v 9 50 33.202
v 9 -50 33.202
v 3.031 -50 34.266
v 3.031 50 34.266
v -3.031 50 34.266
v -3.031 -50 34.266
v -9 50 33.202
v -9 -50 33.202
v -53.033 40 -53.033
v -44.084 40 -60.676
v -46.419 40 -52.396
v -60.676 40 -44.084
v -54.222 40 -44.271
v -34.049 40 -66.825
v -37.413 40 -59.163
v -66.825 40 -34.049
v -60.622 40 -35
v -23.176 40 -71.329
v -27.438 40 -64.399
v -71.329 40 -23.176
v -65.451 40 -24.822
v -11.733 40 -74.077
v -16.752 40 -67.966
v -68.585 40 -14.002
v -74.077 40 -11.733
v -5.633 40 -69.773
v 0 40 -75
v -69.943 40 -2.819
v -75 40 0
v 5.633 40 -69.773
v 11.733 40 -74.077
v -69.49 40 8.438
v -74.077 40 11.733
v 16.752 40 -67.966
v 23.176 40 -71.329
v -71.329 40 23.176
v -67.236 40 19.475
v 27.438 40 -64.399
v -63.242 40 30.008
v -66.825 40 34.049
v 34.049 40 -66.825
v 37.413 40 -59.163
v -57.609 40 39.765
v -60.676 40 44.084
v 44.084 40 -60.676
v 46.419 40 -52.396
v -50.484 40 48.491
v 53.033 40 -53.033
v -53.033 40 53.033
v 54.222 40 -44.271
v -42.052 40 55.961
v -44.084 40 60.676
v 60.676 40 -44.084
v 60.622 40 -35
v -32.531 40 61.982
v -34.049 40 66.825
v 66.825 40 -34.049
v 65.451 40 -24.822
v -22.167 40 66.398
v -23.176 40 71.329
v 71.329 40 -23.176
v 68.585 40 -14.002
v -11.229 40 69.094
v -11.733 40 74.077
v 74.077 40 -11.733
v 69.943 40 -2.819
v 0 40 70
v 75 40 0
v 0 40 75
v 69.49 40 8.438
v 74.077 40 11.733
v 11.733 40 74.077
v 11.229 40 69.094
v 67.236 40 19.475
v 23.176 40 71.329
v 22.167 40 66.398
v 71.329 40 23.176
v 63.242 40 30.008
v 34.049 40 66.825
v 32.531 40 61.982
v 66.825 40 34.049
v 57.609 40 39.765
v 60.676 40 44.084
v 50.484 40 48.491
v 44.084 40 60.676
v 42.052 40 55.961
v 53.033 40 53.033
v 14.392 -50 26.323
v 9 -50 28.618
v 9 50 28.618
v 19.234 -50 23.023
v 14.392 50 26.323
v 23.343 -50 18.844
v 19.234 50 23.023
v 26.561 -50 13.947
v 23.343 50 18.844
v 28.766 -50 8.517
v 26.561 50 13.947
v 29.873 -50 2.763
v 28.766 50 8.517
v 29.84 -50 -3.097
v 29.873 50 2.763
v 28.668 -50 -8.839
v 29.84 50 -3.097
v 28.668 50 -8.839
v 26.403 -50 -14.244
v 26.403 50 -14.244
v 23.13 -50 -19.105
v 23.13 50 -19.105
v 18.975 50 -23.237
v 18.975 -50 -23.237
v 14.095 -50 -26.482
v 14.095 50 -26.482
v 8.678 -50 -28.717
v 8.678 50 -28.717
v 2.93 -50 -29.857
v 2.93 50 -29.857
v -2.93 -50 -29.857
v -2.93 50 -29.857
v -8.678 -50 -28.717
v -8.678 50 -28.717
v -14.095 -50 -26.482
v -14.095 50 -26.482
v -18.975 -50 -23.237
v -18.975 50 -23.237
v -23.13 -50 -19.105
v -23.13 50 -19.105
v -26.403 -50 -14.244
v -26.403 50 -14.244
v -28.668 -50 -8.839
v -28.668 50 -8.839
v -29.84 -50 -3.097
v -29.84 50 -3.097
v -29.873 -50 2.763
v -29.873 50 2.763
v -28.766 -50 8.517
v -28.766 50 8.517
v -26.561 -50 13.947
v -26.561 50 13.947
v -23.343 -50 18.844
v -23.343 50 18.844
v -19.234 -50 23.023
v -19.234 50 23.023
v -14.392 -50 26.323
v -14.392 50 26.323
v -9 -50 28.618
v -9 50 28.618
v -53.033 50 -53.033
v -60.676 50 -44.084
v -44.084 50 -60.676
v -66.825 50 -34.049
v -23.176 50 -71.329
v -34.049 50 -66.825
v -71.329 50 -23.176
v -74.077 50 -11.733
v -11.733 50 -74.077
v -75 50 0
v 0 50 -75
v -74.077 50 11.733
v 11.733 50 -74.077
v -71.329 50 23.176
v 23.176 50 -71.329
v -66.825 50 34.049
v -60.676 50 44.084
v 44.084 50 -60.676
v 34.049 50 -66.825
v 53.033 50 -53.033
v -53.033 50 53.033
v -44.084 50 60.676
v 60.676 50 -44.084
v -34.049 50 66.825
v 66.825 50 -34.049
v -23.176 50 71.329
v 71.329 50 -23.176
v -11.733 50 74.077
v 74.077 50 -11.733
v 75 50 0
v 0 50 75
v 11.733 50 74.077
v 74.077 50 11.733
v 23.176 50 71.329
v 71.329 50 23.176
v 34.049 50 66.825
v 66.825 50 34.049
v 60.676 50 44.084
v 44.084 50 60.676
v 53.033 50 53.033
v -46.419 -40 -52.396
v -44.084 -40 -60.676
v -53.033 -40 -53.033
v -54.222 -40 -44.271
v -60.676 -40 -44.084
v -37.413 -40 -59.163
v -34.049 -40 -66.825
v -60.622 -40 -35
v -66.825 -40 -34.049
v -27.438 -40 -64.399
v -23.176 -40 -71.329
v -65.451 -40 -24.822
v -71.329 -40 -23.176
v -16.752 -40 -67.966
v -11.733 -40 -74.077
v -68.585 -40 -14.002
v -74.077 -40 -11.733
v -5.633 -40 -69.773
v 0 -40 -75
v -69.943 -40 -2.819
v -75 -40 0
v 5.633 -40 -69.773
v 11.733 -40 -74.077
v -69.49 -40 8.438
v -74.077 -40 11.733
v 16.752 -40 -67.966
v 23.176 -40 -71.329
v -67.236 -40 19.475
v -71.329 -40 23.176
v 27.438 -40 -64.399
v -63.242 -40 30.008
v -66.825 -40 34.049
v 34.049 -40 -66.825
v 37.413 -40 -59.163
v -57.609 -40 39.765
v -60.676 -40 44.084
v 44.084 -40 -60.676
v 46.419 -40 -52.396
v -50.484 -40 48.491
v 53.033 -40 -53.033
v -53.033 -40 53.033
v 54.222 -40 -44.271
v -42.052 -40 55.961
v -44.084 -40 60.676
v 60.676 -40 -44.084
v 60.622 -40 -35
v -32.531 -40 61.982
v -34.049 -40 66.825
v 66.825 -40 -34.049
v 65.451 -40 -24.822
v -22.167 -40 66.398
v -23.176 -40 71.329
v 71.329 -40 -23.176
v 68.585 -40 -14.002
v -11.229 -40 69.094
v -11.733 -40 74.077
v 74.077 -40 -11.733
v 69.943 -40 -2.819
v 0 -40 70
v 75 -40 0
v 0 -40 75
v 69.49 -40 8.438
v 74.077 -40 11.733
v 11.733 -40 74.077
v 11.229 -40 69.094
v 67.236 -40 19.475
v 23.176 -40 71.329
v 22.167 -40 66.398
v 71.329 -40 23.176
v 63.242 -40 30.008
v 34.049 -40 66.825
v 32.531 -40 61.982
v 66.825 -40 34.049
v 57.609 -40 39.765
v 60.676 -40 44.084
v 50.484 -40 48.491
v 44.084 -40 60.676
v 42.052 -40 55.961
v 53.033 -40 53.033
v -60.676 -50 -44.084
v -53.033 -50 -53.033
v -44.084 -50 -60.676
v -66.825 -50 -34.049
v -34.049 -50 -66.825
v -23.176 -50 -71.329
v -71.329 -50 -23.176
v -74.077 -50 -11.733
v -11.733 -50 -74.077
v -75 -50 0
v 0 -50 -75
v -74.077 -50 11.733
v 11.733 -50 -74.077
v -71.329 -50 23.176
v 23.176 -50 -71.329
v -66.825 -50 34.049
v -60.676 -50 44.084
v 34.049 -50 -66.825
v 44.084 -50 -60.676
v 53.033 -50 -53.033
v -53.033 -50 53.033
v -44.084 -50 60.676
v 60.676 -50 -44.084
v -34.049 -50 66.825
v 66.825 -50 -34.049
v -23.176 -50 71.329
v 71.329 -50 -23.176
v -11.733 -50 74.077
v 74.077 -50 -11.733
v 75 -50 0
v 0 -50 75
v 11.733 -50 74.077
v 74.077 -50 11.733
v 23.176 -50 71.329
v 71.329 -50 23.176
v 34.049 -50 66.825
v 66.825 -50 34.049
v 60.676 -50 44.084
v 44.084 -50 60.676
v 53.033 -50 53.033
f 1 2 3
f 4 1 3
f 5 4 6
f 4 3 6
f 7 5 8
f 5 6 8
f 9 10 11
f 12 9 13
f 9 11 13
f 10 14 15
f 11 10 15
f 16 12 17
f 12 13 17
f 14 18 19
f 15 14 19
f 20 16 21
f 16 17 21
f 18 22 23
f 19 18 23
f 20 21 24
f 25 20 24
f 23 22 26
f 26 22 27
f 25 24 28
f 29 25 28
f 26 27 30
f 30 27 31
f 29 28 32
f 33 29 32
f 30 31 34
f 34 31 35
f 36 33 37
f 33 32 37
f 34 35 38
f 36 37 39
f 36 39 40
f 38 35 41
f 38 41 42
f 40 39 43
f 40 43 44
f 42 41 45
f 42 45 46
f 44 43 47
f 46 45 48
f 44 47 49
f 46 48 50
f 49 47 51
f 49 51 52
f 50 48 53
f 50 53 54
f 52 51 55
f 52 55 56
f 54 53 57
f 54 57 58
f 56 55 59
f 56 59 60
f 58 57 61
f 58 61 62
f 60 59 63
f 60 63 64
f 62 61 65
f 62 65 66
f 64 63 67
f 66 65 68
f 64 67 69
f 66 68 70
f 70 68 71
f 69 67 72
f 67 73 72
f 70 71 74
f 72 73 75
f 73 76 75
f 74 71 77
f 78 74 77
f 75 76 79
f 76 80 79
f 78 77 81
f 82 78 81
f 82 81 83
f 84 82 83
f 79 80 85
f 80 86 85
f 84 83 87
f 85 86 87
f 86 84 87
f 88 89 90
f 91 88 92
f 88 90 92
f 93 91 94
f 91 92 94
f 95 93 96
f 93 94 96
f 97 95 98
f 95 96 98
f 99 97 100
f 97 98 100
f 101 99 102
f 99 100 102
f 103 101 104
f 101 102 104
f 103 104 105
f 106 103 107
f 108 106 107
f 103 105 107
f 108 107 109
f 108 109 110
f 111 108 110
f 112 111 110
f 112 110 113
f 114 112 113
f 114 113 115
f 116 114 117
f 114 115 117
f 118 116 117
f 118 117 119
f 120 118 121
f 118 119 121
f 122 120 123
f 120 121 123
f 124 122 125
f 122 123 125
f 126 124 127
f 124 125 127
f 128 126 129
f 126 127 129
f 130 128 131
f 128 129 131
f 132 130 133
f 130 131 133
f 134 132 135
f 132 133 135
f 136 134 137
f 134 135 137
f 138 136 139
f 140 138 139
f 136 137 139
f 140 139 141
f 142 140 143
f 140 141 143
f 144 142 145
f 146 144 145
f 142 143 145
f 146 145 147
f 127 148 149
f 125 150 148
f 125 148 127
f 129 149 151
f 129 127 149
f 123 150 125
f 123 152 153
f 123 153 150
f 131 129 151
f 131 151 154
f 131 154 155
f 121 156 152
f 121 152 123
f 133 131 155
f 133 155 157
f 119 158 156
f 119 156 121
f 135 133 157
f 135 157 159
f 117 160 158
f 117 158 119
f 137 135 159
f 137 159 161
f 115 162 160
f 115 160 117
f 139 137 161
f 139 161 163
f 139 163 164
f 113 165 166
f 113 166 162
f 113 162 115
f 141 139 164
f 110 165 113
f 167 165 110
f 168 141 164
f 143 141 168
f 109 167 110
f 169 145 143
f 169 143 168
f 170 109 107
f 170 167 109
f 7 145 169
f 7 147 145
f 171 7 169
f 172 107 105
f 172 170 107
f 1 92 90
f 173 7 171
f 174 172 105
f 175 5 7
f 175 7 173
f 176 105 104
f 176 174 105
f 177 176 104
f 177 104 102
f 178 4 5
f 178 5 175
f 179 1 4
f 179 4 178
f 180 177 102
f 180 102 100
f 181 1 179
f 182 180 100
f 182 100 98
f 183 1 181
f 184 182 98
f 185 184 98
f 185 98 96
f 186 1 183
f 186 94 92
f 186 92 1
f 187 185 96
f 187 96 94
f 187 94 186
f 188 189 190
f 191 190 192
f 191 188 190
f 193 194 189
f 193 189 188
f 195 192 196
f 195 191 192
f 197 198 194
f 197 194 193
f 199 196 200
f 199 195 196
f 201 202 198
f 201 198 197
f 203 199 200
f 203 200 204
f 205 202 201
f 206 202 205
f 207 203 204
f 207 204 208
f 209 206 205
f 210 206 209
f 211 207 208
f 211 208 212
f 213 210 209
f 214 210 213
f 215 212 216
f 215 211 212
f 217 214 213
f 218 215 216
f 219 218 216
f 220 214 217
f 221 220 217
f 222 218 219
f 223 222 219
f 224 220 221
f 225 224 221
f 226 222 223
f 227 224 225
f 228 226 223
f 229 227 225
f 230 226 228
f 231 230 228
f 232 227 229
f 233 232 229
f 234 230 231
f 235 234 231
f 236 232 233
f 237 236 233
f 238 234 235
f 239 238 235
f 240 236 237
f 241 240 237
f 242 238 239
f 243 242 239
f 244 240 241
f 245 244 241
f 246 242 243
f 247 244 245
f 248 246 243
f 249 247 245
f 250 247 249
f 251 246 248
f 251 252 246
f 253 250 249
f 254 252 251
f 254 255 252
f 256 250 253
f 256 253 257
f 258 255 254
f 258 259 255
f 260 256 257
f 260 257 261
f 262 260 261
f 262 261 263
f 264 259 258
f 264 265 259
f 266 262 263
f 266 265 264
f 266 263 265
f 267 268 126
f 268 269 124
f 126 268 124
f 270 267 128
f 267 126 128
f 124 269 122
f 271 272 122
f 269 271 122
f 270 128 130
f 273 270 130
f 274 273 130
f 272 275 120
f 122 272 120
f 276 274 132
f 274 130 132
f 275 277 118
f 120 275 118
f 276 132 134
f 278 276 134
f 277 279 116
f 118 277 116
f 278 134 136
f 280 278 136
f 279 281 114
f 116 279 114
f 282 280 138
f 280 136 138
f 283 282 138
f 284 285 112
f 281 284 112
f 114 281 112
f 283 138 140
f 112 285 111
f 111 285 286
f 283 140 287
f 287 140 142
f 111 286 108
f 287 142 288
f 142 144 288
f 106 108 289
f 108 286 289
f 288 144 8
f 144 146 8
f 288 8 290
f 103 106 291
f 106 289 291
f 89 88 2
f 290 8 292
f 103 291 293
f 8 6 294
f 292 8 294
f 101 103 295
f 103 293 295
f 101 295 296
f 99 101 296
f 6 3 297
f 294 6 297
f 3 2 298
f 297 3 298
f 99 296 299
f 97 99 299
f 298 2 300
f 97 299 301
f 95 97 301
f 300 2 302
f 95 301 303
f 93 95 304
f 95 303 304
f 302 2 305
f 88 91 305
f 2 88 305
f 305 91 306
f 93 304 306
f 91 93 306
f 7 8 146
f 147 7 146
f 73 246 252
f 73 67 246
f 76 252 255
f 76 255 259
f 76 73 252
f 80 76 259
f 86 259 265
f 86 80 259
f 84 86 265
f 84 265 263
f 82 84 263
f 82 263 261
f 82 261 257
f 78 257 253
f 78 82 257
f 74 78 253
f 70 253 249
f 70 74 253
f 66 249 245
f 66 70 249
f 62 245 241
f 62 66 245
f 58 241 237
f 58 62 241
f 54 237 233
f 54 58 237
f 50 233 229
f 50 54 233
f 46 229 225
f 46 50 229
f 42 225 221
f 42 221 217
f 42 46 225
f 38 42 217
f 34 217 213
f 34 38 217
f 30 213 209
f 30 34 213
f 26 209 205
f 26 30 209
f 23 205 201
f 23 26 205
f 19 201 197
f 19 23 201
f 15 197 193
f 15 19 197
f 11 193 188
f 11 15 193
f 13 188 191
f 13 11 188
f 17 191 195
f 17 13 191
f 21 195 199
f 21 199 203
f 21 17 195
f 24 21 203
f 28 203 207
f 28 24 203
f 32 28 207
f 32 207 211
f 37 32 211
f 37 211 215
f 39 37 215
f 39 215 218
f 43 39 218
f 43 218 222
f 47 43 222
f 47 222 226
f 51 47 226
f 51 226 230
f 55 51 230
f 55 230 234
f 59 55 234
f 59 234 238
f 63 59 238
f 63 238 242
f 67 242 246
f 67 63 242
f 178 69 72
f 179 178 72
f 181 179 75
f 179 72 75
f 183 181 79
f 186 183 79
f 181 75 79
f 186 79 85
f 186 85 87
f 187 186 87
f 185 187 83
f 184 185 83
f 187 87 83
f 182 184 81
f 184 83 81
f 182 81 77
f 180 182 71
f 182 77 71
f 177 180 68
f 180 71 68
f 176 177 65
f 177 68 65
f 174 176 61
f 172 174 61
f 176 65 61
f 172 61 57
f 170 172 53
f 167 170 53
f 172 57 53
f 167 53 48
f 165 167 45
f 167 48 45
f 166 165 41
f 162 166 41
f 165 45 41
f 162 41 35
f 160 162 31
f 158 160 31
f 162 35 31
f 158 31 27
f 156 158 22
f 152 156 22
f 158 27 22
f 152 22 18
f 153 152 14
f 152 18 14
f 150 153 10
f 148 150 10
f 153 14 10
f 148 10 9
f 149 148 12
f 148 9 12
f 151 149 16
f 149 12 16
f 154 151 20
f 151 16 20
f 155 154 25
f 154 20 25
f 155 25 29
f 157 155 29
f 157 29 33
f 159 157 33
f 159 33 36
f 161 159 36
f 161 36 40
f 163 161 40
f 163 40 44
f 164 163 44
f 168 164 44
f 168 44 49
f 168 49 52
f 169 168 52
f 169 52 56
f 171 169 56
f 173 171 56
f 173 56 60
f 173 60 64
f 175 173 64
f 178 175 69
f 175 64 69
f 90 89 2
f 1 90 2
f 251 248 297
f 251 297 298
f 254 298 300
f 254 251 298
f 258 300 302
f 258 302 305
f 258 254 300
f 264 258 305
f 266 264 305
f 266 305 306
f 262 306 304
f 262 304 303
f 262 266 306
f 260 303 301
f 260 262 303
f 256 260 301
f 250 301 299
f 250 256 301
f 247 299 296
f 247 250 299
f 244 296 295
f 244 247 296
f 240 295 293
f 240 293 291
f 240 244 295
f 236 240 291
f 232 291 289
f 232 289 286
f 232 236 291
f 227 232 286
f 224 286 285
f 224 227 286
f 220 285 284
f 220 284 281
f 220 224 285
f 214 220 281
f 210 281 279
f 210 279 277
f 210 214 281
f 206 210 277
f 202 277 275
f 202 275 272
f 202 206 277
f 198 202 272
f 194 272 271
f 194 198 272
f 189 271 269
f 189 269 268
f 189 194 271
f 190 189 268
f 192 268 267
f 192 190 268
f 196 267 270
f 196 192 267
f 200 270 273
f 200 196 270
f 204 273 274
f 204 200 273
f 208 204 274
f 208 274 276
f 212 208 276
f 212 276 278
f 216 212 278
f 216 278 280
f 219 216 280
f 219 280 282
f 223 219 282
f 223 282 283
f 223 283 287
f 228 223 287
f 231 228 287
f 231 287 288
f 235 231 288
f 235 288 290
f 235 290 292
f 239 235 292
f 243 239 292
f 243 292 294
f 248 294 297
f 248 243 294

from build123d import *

# Parameters (mm, degrees)
SKETCH1_R           = 70
SKETCH1_R_2         = 30
BOSS_EXTRUDE1_DEPTH = 40
SKETCH2_R           = 75
SKETCH2_R_2         = 30
BOSS_EXTRUDE2_DEPTH = 10
CUT_EXTRUDE1_DEPTH  = 146.773797371


with BuildPart() as part:
    # Sketch1 → Boss-Extrude1 (new, symmetric)
    with BuildSketch(Plane(origin=(0, 0, 0), x_dir=(1, 0, 0), z_dir=(0, 1, 0))):
        with Locations(Location((0, 0, 0), (0, 0, 270))):
            Circle(SKETCH1_R)
        with Locations(Location((0, 0, 0), (0, 0, 270))):
            Circle(SKETCH1_R_2, mode=Mode.SUBTRACT)
    extrude(amount=BOSS_EXTRUDE1_DEPTH, both=True)

    # Sketch2 → Boss-Extrude2 (add)
    with BuildSketch(Plane(origin=(0, 40, 0), x_dir=(1, 0, 0), z_dir=(0, 1, 0))):
        with Locations(Location((0, 0, 0), (0, 0, 270))):
            Circle(SKETCH2_R)
        with Locations(Location((0, 0, 0), (0, 0, 270))):
            Circle(SKETCH2_R_2, mode=Mode.SUBTRACT)
    boss_extrude2 = extrude(amount=BOSS_EXTRUDE2_DEPTH)

    # Mirror1: Boss-Extrude2 across plane
    add(boss_extrude2.mirror(Plane.ZX))

    # Sketch3 → Cut-Extrude1 (cut, through all)
    with BuildSketch(Plane.XZ.offset(50)):
        with BuildLine():
            Line((-9, 33.20180718), (-9, 19.467949782))
            Line((-9, 19.467949782), (9, 19.467949782))
            Line((9, 19.467949782), (9, 33.20180718))
            ThreePointArc((9, 33.20180718), (0, 34.4), (-9, 33.20180718))
        make_face()
    extrude(amount=-CUT_EXTRUDE1_DEPTH, mode=Mode.SUBTRACT)


solid = part.part
